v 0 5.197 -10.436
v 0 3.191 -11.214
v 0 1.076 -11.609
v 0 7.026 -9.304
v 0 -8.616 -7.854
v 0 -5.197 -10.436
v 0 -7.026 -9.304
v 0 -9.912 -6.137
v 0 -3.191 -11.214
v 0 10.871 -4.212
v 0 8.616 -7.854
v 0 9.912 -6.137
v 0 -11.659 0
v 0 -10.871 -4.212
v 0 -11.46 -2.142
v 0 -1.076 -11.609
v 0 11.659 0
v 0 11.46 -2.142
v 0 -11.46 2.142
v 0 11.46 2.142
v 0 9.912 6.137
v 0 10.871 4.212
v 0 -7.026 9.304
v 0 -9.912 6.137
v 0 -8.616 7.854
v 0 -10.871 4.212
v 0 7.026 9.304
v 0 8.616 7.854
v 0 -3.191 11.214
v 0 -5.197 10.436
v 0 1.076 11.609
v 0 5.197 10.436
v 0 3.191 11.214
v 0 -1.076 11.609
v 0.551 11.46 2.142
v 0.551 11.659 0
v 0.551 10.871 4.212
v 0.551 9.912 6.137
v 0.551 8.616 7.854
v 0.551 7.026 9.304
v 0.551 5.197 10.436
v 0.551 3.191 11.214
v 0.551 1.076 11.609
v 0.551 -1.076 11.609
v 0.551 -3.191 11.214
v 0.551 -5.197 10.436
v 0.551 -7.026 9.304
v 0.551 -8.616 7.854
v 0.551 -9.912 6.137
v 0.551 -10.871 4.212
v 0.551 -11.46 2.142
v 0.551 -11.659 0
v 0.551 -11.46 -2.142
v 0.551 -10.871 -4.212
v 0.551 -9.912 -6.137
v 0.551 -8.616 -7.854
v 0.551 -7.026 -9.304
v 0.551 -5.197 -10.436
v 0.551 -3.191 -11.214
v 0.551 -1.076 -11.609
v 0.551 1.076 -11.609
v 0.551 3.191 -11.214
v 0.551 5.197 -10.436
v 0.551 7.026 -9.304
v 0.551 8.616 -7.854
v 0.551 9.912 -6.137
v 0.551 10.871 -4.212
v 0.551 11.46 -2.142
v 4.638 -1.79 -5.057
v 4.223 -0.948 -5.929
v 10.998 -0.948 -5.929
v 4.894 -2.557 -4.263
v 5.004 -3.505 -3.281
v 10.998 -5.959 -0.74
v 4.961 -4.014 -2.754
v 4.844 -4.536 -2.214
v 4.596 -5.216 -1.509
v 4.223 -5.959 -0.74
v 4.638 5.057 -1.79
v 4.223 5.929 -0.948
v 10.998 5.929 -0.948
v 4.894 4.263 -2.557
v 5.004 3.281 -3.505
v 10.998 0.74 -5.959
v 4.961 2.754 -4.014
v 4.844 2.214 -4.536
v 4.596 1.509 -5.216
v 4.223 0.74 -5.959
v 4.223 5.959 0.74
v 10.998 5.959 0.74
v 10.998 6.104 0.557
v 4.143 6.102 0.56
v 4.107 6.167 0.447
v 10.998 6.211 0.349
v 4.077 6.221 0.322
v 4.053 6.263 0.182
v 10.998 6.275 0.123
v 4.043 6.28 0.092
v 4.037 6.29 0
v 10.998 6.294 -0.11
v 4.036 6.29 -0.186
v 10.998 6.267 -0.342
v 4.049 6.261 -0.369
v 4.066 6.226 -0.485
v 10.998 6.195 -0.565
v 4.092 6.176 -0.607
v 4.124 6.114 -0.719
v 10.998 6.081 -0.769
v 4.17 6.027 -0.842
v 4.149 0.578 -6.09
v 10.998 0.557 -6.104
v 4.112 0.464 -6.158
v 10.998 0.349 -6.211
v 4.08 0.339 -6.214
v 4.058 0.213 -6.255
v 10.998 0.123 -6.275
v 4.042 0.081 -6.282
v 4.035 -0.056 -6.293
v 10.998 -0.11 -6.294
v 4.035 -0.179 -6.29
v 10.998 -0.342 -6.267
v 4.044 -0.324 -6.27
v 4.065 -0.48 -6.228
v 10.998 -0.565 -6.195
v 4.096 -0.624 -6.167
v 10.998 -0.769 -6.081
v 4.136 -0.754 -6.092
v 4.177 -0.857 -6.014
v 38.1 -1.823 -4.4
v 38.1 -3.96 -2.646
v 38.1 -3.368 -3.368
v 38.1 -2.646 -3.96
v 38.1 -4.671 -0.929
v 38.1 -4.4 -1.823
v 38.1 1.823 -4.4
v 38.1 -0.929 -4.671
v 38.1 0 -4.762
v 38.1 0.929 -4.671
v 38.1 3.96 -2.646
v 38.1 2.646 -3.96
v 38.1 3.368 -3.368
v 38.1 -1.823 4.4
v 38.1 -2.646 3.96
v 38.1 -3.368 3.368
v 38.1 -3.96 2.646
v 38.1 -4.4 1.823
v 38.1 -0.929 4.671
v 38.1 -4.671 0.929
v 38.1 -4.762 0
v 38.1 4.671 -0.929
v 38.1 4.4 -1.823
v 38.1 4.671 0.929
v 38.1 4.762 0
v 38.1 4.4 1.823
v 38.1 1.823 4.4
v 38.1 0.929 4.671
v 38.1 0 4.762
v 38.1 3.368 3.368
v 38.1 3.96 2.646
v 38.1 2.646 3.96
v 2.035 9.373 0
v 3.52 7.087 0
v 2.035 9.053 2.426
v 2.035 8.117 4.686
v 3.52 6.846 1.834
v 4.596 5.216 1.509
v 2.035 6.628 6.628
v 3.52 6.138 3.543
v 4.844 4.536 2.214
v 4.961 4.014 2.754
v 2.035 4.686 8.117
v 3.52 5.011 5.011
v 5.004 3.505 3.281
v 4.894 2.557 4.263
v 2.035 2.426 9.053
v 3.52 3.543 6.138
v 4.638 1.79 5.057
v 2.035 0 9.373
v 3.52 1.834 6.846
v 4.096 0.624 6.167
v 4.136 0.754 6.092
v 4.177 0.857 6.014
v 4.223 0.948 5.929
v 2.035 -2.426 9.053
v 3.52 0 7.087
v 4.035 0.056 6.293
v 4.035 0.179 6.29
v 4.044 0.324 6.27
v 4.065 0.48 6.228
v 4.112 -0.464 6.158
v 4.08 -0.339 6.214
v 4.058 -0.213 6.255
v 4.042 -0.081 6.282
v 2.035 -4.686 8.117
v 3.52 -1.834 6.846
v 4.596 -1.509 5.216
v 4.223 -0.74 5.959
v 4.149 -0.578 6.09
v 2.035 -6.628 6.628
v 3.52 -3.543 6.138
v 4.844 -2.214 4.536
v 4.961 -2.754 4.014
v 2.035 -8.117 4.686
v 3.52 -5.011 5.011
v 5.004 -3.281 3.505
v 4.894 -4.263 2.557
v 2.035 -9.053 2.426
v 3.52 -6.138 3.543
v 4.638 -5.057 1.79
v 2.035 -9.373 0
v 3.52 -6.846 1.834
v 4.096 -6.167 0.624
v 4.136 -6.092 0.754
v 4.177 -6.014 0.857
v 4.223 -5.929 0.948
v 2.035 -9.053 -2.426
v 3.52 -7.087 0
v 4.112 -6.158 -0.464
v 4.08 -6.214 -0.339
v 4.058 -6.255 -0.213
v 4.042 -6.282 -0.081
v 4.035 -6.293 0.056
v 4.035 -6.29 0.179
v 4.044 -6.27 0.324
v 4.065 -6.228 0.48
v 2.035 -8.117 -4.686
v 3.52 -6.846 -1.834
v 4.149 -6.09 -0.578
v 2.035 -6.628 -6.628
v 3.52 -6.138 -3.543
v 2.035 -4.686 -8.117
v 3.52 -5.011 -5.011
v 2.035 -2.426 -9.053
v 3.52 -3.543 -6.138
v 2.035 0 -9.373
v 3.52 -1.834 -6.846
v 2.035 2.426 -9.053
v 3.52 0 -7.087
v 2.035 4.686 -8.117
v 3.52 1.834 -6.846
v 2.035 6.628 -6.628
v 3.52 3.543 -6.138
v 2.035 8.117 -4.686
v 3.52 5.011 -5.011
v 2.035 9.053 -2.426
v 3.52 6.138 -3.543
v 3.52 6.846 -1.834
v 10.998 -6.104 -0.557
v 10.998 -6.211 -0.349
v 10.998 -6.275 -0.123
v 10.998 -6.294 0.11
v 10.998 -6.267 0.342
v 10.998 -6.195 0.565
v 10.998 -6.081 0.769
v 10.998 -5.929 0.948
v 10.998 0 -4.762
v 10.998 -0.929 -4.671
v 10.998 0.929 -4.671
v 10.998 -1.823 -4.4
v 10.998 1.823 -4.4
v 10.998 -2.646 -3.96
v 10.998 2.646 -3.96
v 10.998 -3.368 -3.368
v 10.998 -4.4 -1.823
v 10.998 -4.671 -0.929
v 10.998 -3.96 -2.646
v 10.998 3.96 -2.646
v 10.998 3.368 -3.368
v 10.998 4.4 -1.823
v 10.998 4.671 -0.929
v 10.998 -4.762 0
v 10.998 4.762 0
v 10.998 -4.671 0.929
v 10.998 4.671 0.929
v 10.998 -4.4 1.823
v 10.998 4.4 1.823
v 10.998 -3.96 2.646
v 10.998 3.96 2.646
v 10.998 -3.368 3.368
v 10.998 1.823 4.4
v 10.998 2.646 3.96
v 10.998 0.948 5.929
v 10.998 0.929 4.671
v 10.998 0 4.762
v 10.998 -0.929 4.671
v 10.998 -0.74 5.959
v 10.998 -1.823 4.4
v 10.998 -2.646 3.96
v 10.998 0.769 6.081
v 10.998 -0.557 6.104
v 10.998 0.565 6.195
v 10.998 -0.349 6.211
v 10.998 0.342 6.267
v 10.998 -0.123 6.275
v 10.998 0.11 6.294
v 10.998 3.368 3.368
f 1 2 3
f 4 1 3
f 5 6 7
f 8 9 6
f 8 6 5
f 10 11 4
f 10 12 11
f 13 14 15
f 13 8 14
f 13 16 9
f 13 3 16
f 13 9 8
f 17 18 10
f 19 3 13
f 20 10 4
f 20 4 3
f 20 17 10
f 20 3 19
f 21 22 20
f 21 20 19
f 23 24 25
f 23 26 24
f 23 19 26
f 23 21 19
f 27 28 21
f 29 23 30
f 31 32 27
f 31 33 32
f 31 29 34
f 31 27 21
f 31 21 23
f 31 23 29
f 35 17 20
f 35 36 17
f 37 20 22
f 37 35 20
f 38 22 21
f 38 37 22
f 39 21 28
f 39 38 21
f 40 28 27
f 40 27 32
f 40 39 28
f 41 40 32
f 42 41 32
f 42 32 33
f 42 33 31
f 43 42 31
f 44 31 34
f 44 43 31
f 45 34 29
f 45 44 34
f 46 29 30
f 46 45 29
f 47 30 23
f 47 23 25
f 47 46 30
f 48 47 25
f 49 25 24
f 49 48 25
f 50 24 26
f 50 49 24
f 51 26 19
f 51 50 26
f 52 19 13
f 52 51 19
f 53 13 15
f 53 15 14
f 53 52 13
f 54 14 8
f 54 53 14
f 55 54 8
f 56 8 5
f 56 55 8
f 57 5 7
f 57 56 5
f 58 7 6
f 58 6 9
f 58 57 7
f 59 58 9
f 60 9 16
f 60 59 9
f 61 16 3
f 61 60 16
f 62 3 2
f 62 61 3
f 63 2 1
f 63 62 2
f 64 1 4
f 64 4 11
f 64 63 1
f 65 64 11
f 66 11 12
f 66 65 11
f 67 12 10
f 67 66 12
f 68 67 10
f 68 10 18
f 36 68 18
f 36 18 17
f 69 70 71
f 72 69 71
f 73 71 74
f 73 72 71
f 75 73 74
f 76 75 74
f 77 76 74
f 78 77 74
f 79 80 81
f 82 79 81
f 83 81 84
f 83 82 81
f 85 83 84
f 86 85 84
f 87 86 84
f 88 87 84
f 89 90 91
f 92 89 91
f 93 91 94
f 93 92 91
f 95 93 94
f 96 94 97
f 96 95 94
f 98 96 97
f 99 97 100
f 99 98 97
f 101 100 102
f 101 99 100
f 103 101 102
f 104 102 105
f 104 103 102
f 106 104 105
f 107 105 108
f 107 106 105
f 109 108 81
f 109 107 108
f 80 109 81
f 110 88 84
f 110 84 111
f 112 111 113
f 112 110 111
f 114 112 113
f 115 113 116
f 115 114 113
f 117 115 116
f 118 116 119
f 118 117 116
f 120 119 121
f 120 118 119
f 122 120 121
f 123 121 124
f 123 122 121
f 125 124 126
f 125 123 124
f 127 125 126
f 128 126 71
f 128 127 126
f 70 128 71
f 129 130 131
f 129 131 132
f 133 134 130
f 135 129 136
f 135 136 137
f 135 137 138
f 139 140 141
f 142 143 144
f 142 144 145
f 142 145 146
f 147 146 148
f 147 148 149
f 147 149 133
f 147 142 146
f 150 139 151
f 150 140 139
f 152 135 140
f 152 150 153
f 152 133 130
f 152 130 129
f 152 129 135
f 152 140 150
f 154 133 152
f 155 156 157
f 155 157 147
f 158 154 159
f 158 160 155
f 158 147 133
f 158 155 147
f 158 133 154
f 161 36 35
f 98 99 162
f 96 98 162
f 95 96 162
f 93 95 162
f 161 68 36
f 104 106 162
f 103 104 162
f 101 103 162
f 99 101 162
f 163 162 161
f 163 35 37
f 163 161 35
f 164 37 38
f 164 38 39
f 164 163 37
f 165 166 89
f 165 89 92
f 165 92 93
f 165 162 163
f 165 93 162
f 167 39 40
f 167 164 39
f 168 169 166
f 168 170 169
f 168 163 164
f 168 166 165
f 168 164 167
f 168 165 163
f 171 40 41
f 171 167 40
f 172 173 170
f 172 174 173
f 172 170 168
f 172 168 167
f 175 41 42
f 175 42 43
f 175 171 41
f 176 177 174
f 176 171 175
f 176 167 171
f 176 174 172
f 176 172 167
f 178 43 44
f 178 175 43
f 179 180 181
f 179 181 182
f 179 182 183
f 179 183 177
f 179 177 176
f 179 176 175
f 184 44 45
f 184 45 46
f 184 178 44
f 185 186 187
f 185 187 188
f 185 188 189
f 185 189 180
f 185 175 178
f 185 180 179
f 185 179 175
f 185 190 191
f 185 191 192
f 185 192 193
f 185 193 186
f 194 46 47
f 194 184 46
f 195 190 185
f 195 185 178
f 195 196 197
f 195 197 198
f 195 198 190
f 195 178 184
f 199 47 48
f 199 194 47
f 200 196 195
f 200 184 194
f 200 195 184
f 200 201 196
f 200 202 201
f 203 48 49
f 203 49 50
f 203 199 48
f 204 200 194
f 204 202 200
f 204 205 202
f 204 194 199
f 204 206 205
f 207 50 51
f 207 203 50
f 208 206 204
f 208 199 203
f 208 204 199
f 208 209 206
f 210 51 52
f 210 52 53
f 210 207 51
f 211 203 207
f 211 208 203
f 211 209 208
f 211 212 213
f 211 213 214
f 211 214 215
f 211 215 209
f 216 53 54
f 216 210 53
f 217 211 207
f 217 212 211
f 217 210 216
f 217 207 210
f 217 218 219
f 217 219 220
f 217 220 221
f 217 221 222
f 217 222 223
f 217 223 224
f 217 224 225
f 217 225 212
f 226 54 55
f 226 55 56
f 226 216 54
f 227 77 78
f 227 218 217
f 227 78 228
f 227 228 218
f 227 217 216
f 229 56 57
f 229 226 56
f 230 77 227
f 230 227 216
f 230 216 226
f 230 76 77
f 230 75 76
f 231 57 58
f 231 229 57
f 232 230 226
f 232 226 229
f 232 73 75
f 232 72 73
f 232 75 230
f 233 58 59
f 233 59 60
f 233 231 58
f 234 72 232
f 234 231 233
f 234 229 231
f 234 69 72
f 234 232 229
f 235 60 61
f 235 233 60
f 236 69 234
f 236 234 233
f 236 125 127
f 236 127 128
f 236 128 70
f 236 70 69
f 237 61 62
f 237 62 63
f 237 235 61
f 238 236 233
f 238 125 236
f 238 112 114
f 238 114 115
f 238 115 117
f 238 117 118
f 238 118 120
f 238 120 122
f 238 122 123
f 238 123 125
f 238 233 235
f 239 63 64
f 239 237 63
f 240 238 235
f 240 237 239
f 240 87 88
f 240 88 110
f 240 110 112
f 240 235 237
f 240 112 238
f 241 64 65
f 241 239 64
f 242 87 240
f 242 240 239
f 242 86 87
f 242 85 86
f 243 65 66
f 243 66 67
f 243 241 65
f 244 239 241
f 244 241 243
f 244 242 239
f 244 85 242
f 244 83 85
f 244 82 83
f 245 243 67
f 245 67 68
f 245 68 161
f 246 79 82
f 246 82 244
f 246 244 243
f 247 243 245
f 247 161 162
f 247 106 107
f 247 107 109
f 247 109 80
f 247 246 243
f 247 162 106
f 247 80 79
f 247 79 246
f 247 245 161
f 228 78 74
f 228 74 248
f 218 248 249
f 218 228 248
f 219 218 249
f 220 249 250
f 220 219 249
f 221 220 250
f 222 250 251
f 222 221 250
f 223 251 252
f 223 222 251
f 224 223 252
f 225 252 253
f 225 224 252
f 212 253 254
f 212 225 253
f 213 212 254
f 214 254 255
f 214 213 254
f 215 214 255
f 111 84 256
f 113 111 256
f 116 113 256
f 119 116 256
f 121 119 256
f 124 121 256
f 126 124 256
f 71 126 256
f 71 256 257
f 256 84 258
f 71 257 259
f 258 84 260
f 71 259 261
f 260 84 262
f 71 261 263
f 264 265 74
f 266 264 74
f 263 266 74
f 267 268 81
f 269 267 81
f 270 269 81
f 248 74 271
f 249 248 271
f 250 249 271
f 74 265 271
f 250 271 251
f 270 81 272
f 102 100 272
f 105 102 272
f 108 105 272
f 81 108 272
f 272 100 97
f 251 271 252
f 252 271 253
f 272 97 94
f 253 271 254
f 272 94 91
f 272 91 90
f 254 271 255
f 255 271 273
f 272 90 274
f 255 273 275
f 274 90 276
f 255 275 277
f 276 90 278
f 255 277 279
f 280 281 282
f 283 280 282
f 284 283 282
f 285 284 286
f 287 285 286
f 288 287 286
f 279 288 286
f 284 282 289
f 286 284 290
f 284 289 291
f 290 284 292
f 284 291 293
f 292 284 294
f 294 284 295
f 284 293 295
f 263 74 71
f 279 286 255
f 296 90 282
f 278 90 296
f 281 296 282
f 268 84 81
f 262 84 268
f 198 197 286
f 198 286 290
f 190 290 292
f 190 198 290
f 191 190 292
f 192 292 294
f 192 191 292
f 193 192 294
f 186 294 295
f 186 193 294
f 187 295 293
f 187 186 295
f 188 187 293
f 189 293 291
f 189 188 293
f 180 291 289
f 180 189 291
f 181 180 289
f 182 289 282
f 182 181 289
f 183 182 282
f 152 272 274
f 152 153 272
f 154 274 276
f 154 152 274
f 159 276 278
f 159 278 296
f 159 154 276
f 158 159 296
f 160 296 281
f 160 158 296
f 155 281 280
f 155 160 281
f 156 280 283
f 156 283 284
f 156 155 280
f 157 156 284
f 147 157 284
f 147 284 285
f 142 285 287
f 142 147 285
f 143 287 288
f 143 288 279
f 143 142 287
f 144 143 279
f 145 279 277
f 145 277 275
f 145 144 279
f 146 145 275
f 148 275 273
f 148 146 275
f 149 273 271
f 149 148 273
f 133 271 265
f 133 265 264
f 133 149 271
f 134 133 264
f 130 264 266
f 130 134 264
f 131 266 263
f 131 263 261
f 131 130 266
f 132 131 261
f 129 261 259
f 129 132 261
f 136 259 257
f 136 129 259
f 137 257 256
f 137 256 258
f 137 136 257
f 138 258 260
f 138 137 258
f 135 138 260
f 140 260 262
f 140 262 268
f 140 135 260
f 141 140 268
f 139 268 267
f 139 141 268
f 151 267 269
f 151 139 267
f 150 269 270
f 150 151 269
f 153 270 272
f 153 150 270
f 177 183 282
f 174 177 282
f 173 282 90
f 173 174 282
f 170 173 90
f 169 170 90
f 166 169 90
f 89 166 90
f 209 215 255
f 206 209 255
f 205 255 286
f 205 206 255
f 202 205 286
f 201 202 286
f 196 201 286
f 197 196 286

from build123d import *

# Parameters (mm, degrees)
NECK_DEPTH = 10.9982


# Read off the part's stored shape, not the designer's step: Cut-Revolve1
with BuildPart() as part:
    # Cut-Revolve1 outline → Cut-Revolve1 (revolve)
    with BuildSketch(Plane.YX):
        Polygon((0, 38.1), (0, 0), (11.6586, 0), (11.6586, 0.550820297), (4.7625, 5.0292), (4.7625, 38.1), align=None)
    revolve(axis=Axis((0, 0, 0), (1, 0, 0)))

    # Sketch2 → Neck (add)
    with BuildSketch(Plane(origin=(0, 0, 0), x_dir=(0, 0.6946583704589985, -0.7193398003386501), z_dir=(1, 0, 0))):
        with BuildLine():
            Line((3.6068, -4.8006), (-3.6068, -4.8006))
            ThreePointArc((-3.6068, -4.8006), (-4.450944075, -4.450944075), (-4.8006, -3.6068))
            Line((-4.8006, -3.6068), (-4.8006, 3.6068))
            ThreePointArc((-4.8006, 3.6068), (-4.450944075, 4.450944075), (-3.6068, 4.8006))
            Line((-3.6068, 4.8006), (3.6068, 4.8006))
            ThreePointArc((3.6068, 4.8006), (4.450944075, 4.450944075), (4.8006, 3.6068))
            Line((4.8006, 3.6068), (4.8006, -3.6068))
            ThreePointArc((4.8006, -3.6068), (4.450944075, -4.450944075), (3.6068, -4.8006))
        make_face()
    extrude(amount=NECK_DEPTH)


solid = part.part
